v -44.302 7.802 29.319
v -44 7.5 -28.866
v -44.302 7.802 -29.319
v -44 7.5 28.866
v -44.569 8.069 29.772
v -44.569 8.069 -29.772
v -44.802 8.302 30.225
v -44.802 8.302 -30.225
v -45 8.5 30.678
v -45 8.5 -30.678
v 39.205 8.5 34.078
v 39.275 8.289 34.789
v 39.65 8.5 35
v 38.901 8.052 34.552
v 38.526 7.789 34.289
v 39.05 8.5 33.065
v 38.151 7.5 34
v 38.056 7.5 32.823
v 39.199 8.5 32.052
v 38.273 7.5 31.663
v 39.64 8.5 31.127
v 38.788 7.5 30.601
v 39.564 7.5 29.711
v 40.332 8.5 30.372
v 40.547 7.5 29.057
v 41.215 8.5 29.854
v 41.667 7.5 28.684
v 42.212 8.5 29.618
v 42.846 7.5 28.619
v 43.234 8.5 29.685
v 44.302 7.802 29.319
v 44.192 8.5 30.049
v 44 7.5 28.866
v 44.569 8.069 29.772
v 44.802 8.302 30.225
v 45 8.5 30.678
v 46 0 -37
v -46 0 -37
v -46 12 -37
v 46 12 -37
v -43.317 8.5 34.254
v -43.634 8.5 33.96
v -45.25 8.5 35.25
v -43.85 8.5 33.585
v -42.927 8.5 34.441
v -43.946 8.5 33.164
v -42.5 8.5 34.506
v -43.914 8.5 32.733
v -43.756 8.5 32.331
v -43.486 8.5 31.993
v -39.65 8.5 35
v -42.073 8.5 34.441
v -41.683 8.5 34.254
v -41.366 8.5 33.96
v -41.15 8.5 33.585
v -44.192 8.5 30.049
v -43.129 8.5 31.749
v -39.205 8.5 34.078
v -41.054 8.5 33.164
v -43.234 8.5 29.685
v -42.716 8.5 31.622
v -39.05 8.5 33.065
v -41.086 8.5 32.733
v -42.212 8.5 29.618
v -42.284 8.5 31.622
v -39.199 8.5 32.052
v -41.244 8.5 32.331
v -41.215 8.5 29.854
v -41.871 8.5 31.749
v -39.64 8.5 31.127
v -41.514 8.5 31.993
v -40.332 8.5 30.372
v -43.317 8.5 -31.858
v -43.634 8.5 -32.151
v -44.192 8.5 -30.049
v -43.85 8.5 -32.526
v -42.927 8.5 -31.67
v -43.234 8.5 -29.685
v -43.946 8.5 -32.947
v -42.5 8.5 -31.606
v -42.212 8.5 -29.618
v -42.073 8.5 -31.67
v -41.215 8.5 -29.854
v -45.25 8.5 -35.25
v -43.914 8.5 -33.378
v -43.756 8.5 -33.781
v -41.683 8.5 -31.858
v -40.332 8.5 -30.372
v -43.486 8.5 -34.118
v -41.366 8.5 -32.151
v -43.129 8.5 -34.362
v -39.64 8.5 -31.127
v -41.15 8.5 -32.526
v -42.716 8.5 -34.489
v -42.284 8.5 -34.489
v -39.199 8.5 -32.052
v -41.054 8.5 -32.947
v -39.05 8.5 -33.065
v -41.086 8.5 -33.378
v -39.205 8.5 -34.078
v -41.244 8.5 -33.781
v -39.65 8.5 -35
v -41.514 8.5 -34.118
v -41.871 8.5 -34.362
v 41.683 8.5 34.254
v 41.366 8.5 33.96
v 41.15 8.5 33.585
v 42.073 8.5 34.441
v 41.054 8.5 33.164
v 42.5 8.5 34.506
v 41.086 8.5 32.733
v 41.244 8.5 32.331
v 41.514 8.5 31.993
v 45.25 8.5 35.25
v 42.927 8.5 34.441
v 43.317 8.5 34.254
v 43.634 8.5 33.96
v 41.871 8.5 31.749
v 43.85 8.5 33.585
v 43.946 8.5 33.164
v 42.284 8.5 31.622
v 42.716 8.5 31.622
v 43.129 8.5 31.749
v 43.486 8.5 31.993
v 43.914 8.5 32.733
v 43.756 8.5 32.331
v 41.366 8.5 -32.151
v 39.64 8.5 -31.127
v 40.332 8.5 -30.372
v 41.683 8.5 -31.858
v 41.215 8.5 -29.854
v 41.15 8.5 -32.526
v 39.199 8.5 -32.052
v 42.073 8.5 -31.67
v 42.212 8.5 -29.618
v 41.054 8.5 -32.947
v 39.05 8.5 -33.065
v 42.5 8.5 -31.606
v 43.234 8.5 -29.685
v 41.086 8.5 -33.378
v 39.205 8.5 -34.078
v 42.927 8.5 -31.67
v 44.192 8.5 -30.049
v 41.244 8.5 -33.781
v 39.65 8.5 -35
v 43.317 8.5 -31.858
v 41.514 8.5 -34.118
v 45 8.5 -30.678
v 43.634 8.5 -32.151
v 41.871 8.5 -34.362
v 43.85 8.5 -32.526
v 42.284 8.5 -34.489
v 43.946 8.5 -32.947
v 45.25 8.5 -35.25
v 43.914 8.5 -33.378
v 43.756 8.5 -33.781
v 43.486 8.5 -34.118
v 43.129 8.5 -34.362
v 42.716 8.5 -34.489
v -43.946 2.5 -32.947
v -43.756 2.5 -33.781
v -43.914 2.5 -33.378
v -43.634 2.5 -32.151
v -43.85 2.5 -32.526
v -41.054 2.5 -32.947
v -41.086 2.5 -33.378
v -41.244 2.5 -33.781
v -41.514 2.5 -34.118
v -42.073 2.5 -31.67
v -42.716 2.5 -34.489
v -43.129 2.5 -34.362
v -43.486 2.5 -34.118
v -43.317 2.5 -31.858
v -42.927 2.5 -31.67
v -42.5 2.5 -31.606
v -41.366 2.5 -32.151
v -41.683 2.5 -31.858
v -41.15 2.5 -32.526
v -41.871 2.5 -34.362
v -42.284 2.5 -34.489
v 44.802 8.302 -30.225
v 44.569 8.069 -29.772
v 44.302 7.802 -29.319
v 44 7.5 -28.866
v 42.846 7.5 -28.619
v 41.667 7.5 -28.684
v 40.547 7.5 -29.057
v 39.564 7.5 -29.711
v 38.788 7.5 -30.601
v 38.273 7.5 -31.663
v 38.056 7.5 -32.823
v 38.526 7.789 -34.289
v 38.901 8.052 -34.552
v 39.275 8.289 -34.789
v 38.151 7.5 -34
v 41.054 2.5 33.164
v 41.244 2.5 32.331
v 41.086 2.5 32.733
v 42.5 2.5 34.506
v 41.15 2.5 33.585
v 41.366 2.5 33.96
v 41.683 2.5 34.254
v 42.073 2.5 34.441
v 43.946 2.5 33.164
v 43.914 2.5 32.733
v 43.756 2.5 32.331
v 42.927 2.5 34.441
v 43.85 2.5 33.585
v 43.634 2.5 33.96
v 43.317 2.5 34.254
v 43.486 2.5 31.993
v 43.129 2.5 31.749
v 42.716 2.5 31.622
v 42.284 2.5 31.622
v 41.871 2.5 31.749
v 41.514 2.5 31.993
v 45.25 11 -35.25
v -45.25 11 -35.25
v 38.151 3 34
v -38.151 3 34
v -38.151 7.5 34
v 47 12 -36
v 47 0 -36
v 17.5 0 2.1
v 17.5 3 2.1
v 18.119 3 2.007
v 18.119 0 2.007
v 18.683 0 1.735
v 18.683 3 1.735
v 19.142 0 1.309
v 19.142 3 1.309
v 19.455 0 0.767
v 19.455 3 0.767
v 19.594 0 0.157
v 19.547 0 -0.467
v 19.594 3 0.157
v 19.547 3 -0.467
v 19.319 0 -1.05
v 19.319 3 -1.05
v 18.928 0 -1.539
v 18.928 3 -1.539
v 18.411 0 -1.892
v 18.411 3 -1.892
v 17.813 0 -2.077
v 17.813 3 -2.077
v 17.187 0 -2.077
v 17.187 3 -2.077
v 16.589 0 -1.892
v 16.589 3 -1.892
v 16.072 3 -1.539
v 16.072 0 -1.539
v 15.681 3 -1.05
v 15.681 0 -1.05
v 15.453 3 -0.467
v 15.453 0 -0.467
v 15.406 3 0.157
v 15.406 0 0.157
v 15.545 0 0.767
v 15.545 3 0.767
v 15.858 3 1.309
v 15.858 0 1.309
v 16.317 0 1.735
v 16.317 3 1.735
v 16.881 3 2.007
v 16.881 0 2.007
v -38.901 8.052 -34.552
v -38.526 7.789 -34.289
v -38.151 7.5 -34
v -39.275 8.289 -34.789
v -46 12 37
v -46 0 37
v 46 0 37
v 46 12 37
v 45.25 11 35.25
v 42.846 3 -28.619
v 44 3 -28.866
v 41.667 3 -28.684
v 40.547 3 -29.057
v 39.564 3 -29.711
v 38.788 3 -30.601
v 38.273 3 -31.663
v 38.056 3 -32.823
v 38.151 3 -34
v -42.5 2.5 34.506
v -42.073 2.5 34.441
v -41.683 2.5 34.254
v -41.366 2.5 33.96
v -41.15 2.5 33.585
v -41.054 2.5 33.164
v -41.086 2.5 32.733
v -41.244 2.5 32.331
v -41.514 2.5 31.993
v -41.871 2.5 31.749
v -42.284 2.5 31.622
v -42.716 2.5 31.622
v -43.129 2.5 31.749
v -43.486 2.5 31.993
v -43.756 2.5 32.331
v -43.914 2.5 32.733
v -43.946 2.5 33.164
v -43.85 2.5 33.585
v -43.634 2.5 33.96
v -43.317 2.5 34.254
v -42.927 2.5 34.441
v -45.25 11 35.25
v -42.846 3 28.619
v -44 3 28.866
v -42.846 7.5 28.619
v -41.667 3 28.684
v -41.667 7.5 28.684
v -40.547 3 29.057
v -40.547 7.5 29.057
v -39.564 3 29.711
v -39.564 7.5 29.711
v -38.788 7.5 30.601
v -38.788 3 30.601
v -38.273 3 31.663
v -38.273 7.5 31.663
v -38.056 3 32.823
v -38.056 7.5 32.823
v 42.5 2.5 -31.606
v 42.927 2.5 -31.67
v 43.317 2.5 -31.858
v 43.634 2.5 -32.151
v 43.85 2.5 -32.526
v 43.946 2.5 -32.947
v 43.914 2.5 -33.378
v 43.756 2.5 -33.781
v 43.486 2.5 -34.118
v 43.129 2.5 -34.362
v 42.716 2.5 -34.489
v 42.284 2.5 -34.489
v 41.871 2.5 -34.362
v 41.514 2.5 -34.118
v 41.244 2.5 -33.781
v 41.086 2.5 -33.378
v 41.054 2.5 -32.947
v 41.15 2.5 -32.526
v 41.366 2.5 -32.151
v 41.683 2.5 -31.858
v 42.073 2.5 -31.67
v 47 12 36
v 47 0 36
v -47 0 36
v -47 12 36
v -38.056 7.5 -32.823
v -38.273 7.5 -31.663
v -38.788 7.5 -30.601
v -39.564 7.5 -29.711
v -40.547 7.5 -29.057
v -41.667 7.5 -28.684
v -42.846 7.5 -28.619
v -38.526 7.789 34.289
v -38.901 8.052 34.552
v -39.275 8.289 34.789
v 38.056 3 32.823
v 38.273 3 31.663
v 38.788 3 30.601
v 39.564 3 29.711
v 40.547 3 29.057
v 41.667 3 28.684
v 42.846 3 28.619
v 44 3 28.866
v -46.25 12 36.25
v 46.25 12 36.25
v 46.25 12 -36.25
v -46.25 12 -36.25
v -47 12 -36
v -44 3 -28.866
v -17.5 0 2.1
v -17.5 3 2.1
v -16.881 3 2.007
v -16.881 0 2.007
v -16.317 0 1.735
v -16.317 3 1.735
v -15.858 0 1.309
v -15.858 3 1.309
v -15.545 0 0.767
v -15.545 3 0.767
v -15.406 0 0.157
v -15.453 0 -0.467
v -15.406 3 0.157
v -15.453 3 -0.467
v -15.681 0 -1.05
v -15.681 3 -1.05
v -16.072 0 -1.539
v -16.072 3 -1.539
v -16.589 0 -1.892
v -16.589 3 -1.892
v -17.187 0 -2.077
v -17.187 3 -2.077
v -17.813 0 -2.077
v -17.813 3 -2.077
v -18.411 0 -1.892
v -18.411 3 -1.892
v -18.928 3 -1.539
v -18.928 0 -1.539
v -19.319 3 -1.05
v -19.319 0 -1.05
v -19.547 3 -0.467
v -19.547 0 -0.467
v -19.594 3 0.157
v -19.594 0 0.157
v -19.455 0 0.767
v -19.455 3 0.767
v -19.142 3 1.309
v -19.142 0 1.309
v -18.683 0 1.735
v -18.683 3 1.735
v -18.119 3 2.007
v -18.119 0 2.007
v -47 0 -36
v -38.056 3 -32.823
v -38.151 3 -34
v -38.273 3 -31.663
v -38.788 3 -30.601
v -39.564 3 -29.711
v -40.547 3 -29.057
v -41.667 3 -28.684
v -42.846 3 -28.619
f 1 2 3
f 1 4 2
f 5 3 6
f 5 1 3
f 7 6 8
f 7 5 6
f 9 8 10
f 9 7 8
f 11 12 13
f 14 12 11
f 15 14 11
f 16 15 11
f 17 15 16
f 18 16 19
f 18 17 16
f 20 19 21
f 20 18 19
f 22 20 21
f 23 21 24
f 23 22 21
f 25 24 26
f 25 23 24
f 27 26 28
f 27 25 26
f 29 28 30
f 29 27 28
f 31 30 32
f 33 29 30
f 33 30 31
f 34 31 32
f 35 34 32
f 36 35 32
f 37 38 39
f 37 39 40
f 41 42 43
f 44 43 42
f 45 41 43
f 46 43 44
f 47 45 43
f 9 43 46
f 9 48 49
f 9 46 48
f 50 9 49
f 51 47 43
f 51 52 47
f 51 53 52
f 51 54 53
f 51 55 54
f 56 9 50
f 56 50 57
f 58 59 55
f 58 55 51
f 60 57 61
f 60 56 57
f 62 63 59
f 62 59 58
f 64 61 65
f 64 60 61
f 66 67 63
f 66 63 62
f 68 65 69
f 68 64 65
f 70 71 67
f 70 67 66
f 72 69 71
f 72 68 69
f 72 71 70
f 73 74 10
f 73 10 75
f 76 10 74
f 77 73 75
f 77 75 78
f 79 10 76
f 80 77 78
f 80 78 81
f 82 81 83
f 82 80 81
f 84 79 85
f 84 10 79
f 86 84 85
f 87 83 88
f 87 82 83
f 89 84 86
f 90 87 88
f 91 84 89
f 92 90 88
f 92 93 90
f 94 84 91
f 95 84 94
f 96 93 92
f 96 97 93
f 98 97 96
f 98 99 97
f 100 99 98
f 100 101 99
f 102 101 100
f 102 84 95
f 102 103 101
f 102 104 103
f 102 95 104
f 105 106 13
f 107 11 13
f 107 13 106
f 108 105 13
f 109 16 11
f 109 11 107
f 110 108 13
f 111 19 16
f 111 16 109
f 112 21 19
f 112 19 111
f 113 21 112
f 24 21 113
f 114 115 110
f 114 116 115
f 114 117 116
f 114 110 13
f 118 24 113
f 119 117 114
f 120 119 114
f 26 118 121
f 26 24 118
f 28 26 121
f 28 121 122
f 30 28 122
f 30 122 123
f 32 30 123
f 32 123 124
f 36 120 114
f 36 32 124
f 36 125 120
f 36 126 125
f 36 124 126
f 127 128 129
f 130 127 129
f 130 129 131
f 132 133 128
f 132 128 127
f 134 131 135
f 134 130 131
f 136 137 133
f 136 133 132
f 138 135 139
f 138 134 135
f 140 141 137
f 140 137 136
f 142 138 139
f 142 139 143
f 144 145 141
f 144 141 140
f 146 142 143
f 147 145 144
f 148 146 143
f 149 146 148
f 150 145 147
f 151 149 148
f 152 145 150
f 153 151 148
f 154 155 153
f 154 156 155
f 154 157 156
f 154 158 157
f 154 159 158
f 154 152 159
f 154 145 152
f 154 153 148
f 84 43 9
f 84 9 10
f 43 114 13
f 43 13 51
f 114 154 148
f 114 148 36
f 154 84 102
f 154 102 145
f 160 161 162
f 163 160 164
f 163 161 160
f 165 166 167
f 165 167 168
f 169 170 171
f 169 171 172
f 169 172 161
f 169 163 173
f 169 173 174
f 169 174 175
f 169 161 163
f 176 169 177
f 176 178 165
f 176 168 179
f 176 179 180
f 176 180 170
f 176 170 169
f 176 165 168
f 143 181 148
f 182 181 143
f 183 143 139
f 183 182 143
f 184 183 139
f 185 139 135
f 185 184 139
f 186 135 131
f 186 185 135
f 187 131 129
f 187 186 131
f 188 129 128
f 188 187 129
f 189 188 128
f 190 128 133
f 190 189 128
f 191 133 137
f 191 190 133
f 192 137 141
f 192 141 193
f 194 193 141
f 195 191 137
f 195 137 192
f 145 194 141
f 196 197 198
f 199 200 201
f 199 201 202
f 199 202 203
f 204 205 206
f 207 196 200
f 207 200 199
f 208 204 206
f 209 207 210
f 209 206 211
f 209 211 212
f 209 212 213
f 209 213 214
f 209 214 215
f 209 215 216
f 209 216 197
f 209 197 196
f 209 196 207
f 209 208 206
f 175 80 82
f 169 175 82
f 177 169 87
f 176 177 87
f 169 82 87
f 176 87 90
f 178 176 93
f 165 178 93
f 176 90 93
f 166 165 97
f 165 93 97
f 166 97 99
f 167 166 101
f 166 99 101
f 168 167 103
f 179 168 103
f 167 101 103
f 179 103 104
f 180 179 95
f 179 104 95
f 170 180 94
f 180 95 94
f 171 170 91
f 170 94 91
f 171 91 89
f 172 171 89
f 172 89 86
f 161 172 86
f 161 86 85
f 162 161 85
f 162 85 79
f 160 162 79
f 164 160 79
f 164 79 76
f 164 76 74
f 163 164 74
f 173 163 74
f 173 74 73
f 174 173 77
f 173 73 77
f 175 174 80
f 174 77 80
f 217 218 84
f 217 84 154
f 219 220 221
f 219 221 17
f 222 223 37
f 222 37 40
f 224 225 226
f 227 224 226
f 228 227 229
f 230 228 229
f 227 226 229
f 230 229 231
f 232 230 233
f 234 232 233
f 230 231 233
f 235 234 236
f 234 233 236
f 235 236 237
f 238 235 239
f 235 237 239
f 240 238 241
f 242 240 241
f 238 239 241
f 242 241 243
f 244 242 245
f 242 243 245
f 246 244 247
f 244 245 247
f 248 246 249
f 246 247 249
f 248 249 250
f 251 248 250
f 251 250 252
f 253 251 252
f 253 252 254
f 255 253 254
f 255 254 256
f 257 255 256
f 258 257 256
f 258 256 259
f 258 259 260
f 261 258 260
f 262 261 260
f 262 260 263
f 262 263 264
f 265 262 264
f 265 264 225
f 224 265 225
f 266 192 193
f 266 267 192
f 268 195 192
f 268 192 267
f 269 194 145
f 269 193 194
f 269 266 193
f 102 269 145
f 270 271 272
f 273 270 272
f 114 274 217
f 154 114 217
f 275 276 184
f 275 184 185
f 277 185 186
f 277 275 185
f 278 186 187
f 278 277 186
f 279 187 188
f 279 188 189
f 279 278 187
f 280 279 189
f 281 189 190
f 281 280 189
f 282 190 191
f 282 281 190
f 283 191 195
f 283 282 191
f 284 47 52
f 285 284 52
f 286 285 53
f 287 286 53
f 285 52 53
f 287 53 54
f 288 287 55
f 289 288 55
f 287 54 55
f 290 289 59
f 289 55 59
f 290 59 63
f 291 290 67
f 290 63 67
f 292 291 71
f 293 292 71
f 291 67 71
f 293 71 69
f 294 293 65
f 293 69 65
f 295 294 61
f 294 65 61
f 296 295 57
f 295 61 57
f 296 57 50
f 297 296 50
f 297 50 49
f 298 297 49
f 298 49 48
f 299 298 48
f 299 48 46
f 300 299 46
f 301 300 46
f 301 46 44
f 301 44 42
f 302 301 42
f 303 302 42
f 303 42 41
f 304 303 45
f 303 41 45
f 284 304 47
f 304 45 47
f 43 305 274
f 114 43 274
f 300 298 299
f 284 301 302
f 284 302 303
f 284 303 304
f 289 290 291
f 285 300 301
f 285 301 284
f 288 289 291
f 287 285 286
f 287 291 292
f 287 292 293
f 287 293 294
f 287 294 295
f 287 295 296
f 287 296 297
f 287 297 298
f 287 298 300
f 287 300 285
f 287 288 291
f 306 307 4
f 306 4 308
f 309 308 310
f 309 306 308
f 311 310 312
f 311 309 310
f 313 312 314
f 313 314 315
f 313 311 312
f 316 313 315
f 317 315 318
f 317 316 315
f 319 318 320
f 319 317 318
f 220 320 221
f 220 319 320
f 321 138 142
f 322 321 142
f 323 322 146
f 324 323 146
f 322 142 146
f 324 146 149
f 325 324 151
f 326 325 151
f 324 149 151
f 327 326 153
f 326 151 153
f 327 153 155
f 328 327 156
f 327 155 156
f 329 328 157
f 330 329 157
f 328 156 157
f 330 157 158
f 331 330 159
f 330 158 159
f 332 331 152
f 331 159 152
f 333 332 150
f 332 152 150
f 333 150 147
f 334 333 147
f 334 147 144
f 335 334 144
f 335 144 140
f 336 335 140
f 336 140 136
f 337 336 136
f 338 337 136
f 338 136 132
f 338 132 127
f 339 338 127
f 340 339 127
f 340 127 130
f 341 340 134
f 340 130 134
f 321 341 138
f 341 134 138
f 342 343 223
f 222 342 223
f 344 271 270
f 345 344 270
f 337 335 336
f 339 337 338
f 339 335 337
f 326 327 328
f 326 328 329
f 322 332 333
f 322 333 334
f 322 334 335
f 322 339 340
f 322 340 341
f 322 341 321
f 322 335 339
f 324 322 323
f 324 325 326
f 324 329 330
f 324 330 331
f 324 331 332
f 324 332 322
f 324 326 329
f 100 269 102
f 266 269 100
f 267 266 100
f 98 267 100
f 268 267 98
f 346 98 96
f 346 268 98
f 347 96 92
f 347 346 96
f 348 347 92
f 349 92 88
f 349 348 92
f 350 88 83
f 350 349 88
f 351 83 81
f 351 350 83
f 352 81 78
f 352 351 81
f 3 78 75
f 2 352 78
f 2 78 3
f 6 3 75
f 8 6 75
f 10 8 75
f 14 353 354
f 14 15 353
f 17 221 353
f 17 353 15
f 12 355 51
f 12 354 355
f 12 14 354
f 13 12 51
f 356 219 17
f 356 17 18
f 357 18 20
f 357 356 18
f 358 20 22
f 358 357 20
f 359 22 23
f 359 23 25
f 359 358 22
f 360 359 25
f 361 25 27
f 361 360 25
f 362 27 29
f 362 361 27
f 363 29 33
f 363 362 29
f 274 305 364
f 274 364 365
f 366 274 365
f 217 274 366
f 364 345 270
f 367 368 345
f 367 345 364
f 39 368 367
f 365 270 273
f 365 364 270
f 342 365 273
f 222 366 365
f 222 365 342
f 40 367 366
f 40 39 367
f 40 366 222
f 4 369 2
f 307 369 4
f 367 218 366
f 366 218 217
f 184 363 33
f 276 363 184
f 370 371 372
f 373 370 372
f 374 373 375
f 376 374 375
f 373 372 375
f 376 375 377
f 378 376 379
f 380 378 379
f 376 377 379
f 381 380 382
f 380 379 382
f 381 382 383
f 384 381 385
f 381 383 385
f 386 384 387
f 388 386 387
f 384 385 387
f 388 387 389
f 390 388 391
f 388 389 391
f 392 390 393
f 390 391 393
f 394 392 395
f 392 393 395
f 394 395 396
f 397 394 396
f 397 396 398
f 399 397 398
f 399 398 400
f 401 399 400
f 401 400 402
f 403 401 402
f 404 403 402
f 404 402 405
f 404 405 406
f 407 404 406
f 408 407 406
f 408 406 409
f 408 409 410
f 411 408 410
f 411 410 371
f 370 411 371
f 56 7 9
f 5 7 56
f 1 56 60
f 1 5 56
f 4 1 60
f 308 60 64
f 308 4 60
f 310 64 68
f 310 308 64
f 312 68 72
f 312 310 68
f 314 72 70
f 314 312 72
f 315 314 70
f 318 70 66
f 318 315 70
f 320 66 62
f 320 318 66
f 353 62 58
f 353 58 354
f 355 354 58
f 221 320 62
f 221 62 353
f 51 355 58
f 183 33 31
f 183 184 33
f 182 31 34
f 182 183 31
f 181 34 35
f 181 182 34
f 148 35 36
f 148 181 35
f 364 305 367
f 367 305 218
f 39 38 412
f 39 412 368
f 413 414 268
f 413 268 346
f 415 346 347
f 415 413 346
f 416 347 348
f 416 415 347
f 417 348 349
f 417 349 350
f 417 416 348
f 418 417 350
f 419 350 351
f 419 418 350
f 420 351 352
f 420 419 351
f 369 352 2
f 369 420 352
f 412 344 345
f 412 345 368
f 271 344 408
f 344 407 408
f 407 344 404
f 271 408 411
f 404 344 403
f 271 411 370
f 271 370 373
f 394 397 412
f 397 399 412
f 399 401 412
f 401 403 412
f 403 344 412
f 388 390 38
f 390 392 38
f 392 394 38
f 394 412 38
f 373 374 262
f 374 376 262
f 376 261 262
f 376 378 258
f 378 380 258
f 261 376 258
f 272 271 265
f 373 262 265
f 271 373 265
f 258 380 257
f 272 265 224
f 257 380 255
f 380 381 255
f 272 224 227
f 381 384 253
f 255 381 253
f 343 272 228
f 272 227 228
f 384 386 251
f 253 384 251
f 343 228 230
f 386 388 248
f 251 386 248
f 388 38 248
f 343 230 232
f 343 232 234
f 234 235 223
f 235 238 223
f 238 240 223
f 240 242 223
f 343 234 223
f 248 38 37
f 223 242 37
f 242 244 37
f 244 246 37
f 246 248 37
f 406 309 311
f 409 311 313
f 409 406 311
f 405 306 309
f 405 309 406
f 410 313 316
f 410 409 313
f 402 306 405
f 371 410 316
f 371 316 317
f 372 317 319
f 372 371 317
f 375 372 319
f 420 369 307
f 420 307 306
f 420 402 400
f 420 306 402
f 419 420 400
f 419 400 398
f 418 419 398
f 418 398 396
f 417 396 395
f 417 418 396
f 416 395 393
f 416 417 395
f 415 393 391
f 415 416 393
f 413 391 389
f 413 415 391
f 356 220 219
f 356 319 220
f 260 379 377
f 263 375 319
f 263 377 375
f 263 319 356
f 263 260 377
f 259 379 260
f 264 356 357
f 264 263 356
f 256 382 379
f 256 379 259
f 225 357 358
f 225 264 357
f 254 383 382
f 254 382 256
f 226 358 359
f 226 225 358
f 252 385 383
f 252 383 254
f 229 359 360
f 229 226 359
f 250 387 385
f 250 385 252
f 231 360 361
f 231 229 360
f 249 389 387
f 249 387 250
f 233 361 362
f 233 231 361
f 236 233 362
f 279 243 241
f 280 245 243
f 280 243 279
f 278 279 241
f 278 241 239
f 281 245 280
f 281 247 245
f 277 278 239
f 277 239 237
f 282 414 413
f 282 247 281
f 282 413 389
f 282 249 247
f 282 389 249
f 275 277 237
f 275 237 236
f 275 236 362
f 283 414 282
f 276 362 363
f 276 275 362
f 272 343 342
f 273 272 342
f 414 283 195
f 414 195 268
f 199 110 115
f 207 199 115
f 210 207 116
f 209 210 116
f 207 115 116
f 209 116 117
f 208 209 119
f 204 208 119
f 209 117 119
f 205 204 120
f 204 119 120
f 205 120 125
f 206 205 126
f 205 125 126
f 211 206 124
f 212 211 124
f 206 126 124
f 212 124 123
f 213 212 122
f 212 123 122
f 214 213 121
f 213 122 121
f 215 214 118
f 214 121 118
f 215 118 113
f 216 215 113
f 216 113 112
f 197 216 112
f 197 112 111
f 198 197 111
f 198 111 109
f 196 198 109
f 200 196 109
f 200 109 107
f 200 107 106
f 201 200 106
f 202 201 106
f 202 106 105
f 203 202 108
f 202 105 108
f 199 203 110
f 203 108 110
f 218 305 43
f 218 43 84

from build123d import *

# Parameters (mm, degrees)
SKETCH1_W           = 94
SKETCH1_H           = 74
BOSS_EXTRUDE1_DEPTH = 12
SKETCH2_W           = 90.5
SKETCH2_H           = 70.5
CUT_EXTRUDE1_DEPTH  = 3.5
SKETCH3_R           = 1.45
CUT_EXTRUDE2_DEPTH  = 6
SHELL1_START        = 3
SHELL1_DEPTH        = 5.5
CHAMFER1_SIZE       = 1
CHAMFER2_SIZE       = 1
CHAMFER3_SIZE       = 1
SKETCH4_R           = 2.1
CUT_EXTRUDE3_DEPTH  = 61.489668539


# Read off the part's stored shape, not the designer's step: Shell1
with BuildPart() as part:
    # Sketch1 → Boss-Extrude1 (new body)
    with BuildSketch(Plane(origin=(0, 0, 0), x_dir=(1, 0, 0), z_dir=(0, 1, 0))):
        Rectangle(SKETCH1_W, SKETCH1_H)
    extrude(amount=BOSS_EXTRUDE1_DEPTH)

    # Sketch2 → Cut-Extrude1 (cut)
    with BuildSketch(Plane(origin=(0, 12, 0), x_dir=(1, 0, 0), z_dir=(0, 1, 0))):
        Rectangle(SKETCH2_W, SKETCH2_H)
    extrude(amount=-CUT_EXTRUDE1_DEPTH, mode=Mode.SUBTRACT)

    # Sketch3 → Cut-Extrude2 (cut)
    with BuildSketch(Plane(origin=(0, 8.5, 0), x_dir=(1, 0, 0), z_dir=(0, 1, 0))):
        with Locations(Location((-42.5, 33.055555556, 0), (0, 0, 270))):
            Circle(SKETCH3_R)
        with Locations(Location((42.5, 33.055555556, 0), (0, 0, 270))):
            Circle(SKETCH3_R)
        with Locations(Location((42.5, -33.055555556, 0), (0, 0, 270))):
            Circle(SKETCH3_R)
        with Locations(Location((-42.5, -33.055555556, 0), (0, 0, 270))):
            Circle(SKETCH3_R)
    extrude(amount=-CUT_EXTRUDE2_DEPTH, mode=Mode.SUBTRACT)

    # Shell1 outline → Shell1 (cut)
    with BuildSketch(Plane(origin=(0, 0, 0), x_dir=(1, 0, 0), z_dir=(0, 1, 0)).offset(SHELL1_START)):
        with BuildLine():
            Line((-38.15137669, -34), (38.15137669, -34))
            ThreePointArc((38.15137669, -34), (39.564324481, -29.711260526), (44, -28.865985172))
            Line((44, -28.865985172), (44, 28.865985172))
            ThreePointArc((44, 28.865985172), (39.564324481, 29.711260526), (38.15137669, 34))
            Line((38.15137669, 34), (-38.15137669, 34))
            ThreePointArc((-38.15137669, 34), (-39.564324481, 29.711260526), (-44, 28.865985172))
            Line((-44, 28.865985172), (-44, -28.865985172))
            ThreePointArc((-44, -28.865985172), (-39.564324481, -29.711260526), (-38.15137669, -34))
        make_face()
    extrude(amount=SHELL1_DEPTH, mode=Mode.SUBTRACT)

    # Chamfer1
    chamfer1_edges = [part.edges().sort_by_distance(p)[0] for p in [
        (45.25, 12, 0),
        (0, 12, -35.25),
        (-45.25, 12, 0),
        (0, 12, 35.25),
    ]]
    chamfer(chamfer1_edges, length=CHAMFER1_SIZE)

    # Chamfer2
    chamfer2_edges = [part.edges().sort_by_distance(p)[0] for p in [
        (0, 8.5, 34),
        (44, 8.5, 0),
        (0, 8.5, -34),
        (-44, 8.5, 0),
        (-39.564324481, 8.5, -29.711260526),
        (39.564324481, 8.5, -29.711260526),
        (39.564324481, 8.5, 29.711260526),
        (-39.564324481, 8.5, 29.711260526),
    ]]
    chamfer(chamfer2_edges, length=CHAMFER2_SIZE)

    # Chamfer3
    chamfer3_edges = [part.edges().sort_by_distance(p)[0] for p in [
        (-47, 6, 37),
        (-47, 6, -37),
        (47, 6, -37),
        (47, 6, 37),
    ]]
    chamfer(chamfer3_edges, length=CHAMFER3_SIZE)

    # Sketch4 → Cut-Extrude3 (cut, through all)
    with BuildSketch(Plane(origin=(0, 3, 0), x_dir=(1, 0, 0), z_dir=(0, 1, 0))):
        with Locations(Location((-17.5, 0, 0), (0, 0, 270))):
            Circle(SKETCH4_R)
        with Locations(Location((17.5, 0, 0), (0, 0, 270))):
            Circle(SKETCH4_R)
    extrude(amount=-CUT_EXTRUDE3_DEPTH, mode=Mode.SUBTRACT)


solid = part.part
